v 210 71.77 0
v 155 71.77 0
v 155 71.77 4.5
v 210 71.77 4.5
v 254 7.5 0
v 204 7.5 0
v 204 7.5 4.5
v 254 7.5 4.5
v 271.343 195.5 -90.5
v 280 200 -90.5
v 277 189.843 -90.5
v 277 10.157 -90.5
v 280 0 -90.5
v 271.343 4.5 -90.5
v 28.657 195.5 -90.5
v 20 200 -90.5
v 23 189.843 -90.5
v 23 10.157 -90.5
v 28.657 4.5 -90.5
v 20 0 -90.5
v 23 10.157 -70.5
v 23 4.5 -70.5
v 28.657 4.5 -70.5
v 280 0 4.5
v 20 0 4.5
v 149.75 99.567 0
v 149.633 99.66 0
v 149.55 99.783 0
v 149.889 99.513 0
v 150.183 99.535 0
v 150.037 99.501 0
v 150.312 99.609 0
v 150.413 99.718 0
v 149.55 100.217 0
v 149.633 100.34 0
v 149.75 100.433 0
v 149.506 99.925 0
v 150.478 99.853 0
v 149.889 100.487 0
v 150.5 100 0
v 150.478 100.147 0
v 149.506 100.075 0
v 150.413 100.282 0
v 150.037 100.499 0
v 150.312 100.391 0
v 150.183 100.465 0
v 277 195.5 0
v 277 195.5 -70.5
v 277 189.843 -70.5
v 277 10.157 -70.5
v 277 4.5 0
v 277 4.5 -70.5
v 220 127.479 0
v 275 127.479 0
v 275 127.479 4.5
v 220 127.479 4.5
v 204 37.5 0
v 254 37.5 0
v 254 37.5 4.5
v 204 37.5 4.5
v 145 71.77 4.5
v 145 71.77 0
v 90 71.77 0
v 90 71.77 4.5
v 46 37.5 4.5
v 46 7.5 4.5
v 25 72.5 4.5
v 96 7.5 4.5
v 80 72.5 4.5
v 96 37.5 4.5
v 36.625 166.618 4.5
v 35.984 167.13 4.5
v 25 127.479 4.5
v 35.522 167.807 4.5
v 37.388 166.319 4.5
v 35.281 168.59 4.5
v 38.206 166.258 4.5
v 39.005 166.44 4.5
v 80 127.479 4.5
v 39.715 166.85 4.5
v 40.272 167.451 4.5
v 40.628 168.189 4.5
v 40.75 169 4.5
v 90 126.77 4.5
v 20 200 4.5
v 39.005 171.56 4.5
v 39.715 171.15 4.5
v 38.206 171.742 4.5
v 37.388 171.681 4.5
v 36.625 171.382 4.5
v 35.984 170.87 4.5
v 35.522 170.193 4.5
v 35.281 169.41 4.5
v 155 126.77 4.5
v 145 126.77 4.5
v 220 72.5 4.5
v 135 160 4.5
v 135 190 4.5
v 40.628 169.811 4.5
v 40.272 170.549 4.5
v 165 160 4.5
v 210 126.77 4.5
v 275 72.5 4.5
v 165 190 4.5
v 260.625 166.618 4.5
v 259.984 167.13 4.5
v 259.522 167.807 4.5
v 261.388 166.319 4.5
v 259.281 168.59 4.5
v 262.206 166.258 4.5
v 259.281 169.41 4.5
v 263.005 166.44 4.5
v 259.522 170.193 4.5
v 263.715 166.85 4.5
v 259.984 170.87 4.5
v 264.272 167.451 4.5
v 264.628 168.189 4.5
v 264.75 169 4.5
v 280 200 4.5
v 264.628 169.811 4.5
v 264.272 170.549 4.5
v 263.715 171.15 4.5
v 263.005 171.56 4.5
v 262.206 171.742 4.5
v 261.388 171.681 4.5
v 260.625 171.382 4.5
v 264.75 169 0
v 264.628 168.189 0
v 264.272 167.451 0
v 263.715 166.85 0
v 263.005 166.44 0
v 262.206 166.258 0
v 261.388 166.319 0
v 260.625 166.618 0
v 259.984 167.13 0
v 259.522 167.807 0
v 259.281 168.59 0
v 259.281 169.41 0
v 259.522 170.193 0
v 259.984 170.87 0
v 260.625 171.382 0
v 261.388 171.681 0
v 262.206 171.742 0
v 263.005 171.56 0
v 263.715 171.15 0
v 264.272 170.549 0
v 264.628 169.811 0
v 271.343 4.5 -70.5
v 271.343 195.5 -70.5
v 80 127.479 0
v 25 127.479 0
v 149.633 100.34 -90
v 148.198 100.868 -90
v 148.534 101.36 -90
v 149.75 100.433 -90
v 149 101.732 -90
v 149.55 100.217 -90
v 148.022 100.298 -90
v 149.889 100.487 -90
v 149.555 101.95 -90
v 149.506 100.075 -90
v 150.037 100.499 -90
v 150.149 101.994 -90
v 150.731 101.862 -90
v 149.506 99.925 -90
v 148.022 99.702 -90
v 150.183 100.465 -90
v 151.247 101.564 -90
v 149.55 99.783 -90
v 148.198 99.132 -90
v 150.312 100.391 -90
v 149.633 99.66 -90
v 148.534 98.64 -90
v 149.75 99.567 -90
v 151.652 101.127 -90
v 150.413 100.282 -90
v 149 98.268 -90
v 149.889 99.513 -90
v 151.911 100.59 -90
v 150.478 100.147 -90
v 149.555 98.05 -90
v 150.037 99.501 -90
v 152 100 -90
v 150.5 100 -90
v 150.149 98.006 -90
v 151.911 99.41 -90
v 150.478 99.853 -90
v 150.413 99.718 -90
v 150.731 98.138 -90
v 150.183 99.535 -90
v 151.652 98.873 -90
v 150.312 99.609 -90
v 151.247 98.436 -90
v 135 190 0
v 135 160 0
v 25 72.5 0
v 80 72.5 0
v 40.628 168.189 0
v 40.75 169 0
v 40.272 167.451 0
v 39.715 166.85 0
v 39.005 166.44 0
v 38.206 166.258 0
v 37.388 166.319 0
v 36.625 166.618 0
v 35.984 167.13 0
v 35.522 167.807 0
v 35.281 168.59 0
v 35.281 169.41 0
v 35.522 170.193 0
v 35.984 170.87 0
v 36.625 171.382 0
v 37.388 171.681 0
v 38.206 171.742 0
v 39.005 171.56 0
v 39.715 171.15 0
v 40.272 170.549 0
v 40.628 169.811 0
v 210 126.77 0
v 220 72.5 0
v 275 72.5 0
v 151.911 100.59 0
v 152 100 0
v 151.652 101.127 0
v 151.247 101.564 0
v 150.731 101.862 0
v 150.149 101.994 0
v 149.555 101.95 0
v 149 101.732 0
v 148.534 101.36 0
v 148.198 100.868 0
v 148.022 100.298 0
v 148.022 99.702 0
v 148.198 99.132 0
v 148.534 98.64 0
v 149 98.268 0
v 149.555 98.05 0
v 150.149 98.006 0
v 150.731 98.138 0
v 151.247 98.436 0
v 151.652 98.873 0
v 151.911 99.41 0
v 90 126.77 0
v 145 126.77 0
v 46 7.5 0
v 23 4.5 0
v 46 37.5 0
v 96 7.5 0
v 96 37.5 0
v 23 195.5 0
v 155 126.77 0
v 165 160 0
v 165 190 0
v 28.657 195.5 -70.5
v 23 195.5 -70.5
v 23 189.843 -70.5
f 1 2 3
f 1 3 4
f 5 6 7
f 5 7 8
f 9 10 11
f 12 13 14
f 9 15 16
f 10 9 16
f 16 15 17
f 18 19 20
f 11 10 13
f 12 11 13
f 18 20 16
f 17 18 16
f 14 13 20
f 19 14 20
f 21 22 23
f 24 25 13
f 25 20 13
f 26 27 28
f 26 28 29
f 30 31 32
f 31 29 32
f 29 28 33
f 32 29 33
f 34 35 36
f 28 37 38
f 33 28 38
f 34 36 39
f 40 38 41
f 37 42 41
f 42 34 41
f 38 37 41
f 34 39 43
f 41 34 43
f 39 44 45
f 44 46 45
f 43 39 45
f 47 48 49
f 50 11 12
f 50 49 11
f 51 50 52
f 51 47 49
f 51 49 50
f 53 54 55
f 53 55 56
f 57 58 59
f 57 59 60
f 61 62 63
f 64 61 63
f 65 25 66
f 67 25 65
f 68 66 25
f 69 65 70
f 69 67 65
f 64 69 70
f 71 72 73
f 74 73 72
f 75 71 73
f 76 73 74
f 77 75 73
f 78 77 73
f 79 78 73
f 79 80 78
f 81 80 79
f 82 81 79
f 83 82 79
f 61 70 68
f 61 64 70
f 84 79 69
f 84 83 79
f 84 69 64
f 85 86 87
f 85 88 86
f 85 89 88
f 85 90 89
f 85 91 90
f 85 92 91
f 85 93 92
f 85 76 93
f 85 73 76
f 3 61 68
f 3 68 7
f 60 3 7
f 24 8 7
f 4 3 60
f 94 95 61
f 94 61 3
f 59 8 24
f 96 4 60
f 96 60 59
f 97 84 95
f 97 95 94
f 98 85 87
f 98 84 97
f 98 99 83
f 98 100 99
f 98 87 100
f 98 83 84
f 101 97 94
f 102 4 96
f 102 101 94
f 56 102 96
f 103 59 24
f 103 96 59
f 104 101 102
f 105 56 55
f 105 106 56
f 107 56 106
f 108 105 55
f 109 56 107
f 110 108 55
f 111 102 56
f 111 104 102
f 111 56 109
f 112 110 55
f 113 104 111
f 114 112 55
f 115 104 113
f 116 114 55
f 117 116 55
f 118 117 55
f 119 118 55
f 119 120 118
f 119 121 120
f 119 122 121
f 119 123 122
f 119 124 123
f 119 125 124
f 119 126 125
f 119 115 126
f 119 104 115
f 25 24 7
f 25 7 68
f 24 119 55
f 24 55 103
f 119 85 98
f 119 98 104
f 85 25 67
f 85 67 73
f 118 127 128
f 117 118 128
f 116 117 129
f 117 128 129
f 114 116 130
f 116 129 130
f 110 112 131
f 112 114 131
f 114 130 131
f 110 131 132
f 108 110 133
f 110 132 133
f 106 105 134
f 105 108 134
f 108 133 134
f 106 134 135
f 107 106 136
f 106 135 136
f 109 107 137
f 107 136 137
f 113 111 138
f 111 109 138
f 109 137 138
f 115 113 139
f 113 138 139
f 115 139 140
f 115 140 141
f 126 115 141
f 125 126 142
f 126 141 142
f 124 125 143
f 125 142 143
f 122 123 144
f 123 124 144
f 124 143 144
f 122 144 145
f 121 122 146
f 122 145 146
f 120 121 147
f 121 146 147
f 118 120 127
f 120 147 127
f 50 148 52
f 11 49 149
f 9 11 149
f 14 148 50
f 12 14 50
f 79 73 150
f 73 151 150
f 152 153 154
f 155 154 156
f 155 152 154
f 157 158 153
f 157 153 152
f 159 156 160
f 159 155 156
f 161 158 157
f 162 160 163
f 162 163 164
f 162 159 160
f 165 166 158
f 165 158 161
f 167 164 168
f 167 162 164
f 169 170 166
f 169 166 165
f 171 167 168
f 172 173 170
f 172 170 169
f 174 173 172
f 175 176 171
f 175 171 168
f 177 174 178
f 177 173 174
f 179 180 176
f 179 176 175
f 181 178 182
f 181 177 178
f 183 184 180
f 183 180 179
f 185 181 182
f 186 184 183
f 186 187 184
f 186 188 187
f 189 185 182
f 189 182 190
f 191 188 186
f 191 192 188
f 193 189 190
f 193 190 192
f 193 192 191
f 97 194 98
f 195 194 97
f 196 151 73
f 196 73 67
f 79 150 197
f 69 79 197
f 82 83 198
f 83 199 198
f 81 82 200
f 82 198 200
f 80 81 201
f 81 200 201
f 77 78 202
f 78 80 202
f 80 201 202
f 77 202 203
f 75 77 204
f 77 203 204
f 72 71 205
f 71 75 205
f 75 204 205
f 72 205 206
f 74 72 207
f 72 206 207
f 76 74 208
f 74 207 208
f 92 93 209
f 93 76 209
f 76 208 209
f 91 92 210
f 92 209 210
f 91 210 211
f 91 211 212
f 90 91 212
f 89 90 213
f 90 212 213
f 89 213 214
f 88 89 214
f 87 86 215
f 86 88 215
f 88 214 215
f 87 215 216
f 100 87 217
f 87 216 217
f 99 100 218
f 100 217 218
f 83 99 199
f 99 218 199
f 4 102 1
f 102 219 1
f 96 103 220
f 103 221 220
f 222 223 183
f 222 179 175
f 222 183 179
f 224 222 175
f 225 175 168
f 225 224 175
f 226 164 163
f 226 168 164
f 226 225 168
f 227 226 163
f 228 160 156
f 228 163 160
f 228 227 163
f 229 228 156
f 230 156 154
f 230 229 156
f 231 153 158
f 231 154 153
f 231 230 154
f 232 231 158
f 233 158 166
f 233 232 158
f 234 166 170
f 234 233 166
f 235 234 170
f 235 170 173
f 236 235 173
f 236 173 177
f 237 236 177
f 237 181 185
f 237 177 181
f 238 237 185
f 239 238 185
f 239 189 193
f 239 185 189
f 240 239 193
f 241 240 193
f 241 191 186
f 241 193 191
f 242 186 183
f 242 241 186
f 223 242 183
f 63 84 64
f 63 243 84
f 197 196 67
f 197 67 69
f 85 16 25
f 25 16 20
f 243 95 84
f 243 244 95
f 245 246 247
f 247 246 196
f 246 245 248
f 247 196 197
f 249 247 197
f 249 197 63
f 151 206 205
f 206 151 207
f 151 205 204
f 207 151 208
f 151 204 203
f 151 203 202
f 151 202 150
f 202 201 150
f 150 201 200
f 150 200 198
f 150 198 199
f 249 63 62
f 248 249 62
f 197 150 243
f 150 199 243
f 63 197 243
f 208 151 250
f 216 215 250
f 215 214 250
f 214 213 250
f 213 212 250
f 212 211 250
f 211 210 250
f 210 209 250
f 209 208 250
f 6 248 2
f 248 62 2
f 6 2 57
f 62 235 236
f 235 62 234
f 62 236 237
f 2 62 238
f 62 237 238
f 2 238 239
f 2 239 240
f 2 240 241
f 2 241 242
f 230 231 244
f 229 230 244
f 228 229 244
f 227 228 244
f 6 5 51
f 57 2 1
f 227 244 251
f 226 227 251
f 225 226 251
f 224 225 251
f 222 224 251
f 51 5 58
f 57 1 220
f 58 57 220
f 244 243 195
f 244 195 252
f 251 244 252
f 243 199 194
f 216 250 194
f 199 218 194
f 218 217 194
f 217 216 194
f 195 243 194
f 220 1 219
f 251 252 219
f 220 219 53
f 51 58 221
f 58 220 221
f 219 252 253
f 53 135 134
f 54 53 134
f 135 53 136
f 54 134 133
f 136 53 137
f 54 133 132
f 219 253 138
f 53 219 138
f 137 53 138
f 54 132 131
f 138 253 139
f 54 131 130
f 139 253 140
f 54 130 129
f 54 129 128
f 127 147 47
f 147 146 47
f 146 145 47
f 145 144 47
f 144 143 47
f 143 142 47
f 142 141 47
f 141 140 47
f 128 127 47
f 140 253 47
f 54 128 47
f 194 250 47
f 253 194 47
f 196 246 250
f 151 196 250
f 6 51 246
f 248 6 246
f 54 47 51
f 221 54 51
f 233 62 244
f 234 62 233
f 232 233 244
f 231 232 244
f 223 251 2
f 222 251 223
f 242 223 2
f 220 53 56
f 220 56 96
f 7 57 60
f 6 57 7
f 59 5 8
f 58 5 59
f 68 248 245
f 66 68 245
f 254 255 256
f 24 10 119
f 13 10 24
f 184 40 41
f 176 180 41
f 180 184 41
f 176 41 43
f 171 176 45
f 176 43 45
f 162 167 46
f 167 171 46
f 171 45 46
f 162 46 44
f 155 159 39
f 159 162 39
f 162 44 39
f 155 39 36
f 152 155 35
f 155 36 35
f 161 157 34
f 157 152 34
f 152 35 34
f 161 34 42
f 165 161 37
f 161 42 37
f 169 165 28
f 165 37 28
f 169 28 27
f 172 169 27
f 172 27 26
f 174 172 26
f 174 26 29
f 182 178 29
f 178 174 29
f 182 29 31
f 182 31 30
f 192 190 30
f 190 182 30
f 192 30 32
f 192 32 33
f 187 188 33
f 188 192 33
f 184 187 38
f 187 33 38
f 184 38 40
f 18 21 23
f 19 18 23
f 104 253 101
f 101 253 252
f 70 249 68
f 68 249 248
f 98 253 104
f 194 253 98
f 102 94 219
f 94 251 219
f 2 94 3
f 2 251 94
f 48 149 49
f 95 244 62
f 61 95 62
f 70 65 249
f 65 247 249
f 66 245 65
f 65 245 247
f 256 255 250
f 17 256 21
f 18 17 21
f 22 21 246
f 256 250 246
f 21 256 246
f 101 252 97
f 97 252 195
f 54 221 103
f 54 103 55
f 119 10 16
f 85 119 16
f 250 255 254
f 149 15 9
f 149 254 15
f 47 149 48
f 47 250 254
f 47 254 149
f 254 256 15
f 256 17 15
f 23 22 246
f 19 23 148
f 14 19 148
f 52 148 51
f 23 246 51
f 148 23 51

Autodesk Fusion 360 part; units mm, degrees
sketch "Sketch1" plane through (0, 0, 0) normal (0, 0, 1) x (1, 0, 0)
  line L0 (0, -35) -> (0, -33.2289) construction
  line L1 (0, -33.2289) -> (0, 259.056) construction
  line L2 (-97.9811, 0) -> (484.4158, 0) construction
  line L3 (0, 0) -> (300, 0)
  line L4 (300, 0) -> (300, 200)
  line L5 (300, 200) -> (0, 200)
  line L6 (0, 200) -> (0, 0)
  line L7 (-60, 100) -> (400, 100) construction
  line L8 (25, 100) -> (25, 127.4792)
  line L9 (25, 100) -> (25, 72.5)
  line L10 (25, 127.4792) -> (80, 127.4792)
  line L11 (25, 72.5) -> (80, 72.5)
  line L12 (80, 127.4792) -> (80, 72.5)
  line L13 (21.5, 100) -> (21.5, 131) construction
  line L14 (21.5, 131) -> (83.5, 131) construction
  line L15 (21.4997, 69) -> (83.5, 69) construction
  circle A0 centre (52.5, 100) radius 31 construction
  circle A1 centre (52.5, 100) radius 27.5 construction
  line L16 (83.5, 131) -> (83.5, 69) construction
  line L17 (290, 69) -> (228, 69) construction
  line L18 (290, 100) -> (290, 69) construction
  line L19 (290, 100) -> (290, 131) construction
  line L20 (290, 131) -> (228, 131) construction
  line L21 (228, 131) -> (228, 69) construction
  line L22 (145, 126.7699) -> (90, 126.7699)
  line L23 (146, 151.2972) -> (93.5, 114.6946) construction
  line L24 (93.5, 114.6946) -> (93.5, 69) construction
  line L25 (146, 69) -> (93.5, 69) construction
  line L26 (146, 100) -> (146, 69) construction
  line L27 (146, 100) -> (146, 151.2972) construction
  line L28 (145, 71.7699) -> (90, 71.7699)
  line L29 (90, 126.7699) -> (90, 71.7699)
  line L30 (156, 131) -> (218, 131) construction
  line L31 (218, 131) -> (218, 69) construction
  line L32 (156, 100) -> (156, 131) construction
  line L33 (156, 100) -> (156, 69) construction
  line L34 (156, 69) -> (218, 69) construction
  line L35 (46, 37.5) -> (96, 37.5)
  line L36 (96, 7.5) -> (46, 7.5)
  line L37 (46, 7.5) -> (46, 37.5)
  line L38 (96, 37.5) -> (96, 7.5)
  line L39 (94, 6) -> (44, 6) construction
  line L40 (44, 6) -> (44, 39) construction
  line L41 (44, 39) -> (94, 39) construction
  line L42 (94, 39) -> (94, 6) construction
  line L43 (94, 6) -> (44, 39) construction
  line L44 (44, 6) -> (94, 39) construction
  line L45 (254, 37.5) -> (204, 37.5)
  line L46 (254, 7.5) -> (254, 37.5)
  line L47 (204, 7.5) -> (254, 7.5)
  line L48 (204, 37.5) -> (204, 7.5)
  circle A2 centre (38, 169) radius 2.75
  circle A3 centre (262, 169) radius 2.75
  line L49 (150, 200) -> (150, 0) construction
  line L50 (145, 126.7699) -> (145, 71.7699)
  line L51 (150, 190) -> (135, 190)
  line L52 (150, 190) -> (165, 190)
  line L53 (135, 190) -> (135, 160)
  line L54 (165, 190) -> (165, 160)
  line L55 (165, 160) -> (135, 160)
  line L56 (155, 126.7699) -> (155, 71.7699)
  line L57 (155, 126.7699) -> (210, 126.7699)
  line L58 (155, 71.7699) -> (210, 71.7699)
  line L59 (210, 126.7699) -> (210, 71.7699)
  line L60 (220, 127.4792) -> (220, 72.5)
  line L61 (275, 127.4792) -> (220, 127.4792)
  line L62 (275, 100) -> (275, 127.4792)
  line L63 (275, 100) -> (275, 72.5)
  line L64 (275, 72.5) -> (220, 72.5)
  line L65 (280, 200) -> (280, 0)
  line L66 (20, 200) -> (20, 0)
  point P0 (69, 22.5)
  dimension "d1" = 300
  dimension "d2" = 200
  dimension "d9" = 27.5
  dimension "d12" = 31
  dimension "d13" = 31
  dimension "d14" = 62
  dimension "d15" = 62
  dimension "d17" = 62
  dimension "d18" = 55
  dimension "d31" = 50
  dimension "d32" = 30
  dimension "d37" = 50
  dimension "d38" = 33
  dimension "d39" = 46
  dimension "d40" = 30
  dimension "d41" = 31.5
  dimension "d42" = 5.5
  dimension "d43" = 38
  dimension "d44" = 38
  dimension "d54" = 10
  dimension "d55" = 4
  dimension "d56" = 64
  dimension "d57" = 55
  dimension "d62" = 55
  dimension "d64" = 55
  dimension "d65" = 90
  dimension "d66" = 90
  dimension "d67" = 90
  dimension "d68" = 90
  dimension "d69" = 10
  dimension "d70" = 5
  dimension "d71" = 15
  dimension "d72" = 15
  dimension "d73" = 30
  dimension "d74" = 46
  dimension "d75" = 50
  dimension "d76" = 30
  dimension "d79" = 20
  dimension "d80" = 20
sketch "Sketch2" plane through (0, 0, 5) normal (0, 0, 1) x (-1, 0, 0)
  line L0 (-145, -71.7699) -> (-90, -71.7699)
  line L1 (-90, -71.7699) -> (-90, -126.7699)
  line L2 (-90, -126.7699) -> (-145, -126.7699)
  circle A0 centre (-38, -169) radius 2.75
  circle A1 centre (-262, -169) radius 2.75
  line L3 (-204, -7.5) -> (-204, -37.5)
  line L4 (-204, -37.5) -> (-254, -37.5)
  line L5 (-254, -37.5) -> (-254, -7.5)
  line L6 (-254, -7.5) -> (-204, -7.5)
  line L7 (-46, -37.5) -> (-96, -37.5)
  line L8 (-96, -37.5) -> (-96, -7.5)
  line L9 (-96, -7.5) -> (-46, -7.5)
  line L10 (-46, -7.5) -> (-46, -37.5)
  line L11 (-25, -72.5) -> (-25, -127.4792)
  line L12 (-25, -127.4792) -> (-80, -127.4792)
  line L13 (-80, -127.4792) -> (-80, -72.5)
  line L14 (-80, -72.5) -> (-25, -72.5)
  line L15 (0, -200) -> (0, 0)
  line L16 (0, 0) -> (-300, 0)
  line L17 (-300, 0) -> (-300, -200)
  line L18 (-300, -200) -> (0, -200)
  line L19 (0, -200) -> (0, 0)
  line L20 (-1, -200) -> (-1, 0)
  line L21 (-299, -200) -> (-299, 0)
  line L22 (-300, -200) -> (-300, 0)
  line L23 (-299, -200) -> (-300, -200)
  line L24 (-300, 0) -> (-299, 0)
  line L25 (-1, 0) -> (0, 0)
  line L26 (0, -200) -> (-1, -200)
  line L27 (-145, -126.7699) -> (-145, -71.7699)
  dimension "d49" = 1
  dimension "d50" = 1
sketch "Sketch5" plane through (0, 0, 0) normal (0, 0, 1) x (1, 0, 0)
  line L0 (20, 200) -> (20, 0)
  line L1 (0, -33.2289) -> (0, 259.056)
  line L2 (280, 200) -> (280, 0)
  line L3 (300, 0) -> (300, 200)
  dimension "d77" = 20
  dimension "d78" = 20
extrude "Extrude4" add sketch "Sketch1" along normal blind 4.5 contours L3 L5 L65 L66
sketch "Sketch6" plane through (0, 0, 4.5) normal (0, 0, 1) x (-1, 0, 0)
  circle A0 centre (-262, -169) radius 2.75
  line L0 (-90, -71.7699) -> (-90, -126.7699)
  line L1 (-90, -126.7699) -> (-145, -126.7699)
  line L2 (-145, -126.7699) -> (-145, -71.7699)
  line L3 (-145, -71.7699) -> (-90, -71.7699)
  line L4 (-25, -72.5) -> (-25, -127.4792)
  line L5 (-25, -127.4792) -> (-80, -127.4792)
  line L6 (-80, -127.4792) -> (-80, -72.5)
  line L7 (-80, -72.5) -> (-25, -72.5)
  line L8 (-46, -37.5) -> (-96, -37.5)
  line L9 (-96, -37.5) -> (-96, -7.5)
  line L10 (-96, -7.5) -> (-46, -7.5)
  line L11 (-46, -7.5) -> (-46, -37.5)
  line L12 (-204, -7.5) -> (-204, -37.5)
  line L13 (-204, -37.5) -> (-254, -37.5)
  line L14 (-254, -37.5) -> (-254, -7.5)
  line L15 (-254, -7.5) -> (-204, -7.5)
  line L16 (-135, -190) -> (-165, -190)
  line L17 (-165, -190) -> (-165, -160)
  line L18 (-165, -160) -> (-135, -160)
  line L19 (-135, -160) -> (-135, -190)
  circle A1 centre (-38, -169) radius 2.75
  line L20 (-155, -71.7699) -> (-155, -126.7699)
  line L21 (-155, -126.7699) -> (-210, -126.7699)
  line L22 (-210, -126.7699) -> (-210, -71.7699)
  line L23 (-210, -71.7699) -> (-155, -71.7699)
  line L24 (-275, -127.4792) -> (-275, -72.5)
  line L25 (-275, -72.5) -> (-220, -72.5)
  line L26 (-220, -72.5) -> (-220, -127.4792)
  line L27 (-220, -127.4792) -> (-275, -127.4792)
  line L28 (-280, -200) -> (-20, -200)
  line L29 (-20, -200) -> (-20, 0)
  line L30 (-20, 0) -> (-280, 0)
  line L31 (-280, 0) -> (-280, -200)
  line L32 (-23, -200) -> (-23, 0)
  line L33 (-277, -200) -> (-277, 0)
  line L34 (-23, -200) -> (-20, -200)
  line L35 (-20, -200) -> (-20, 0)
  line L36 (-23, 0) -> (-20, 0)
  line L37 (-277, 0) -> (-280, 0)
  line L38 (-280, 0) -> (-280, -200)
  line L39 (-277, -200) -> (-280, -200)
  dimension "d83" = 3
  dimension "d84" = 3
extrude "Extrude5" add sketch "Sketch6" against normal blind 95 contours L28 L30 L31 L33 L37 L38 L39 | L28 L29 L30 L32 L34 L35 L36
sketch "Sketch7" plane through (0, 0, 4.5) normal (0, 0, 1) x (-1, 0, 0)
  line L0 (-20, 0) -> (-280, 0)
  line L1 (-280, 0) -> (-280, -200)
  line L2 (-280, -200) -> (-20, -200)
  line L3 (-20, -200) -> (-20, 0)
  circle A0 centre (-262, -169) radius 2.75
  line L4 (-90, -71.7699) -> (-90, -126.7699)
  line L5 (-90, -126.7699) -> (-145, -126.7699)
  line L6 (-145, -126.7699) -> (-145, -71.7699)
  line L7 (-145, -71.7699) -> (-90, -71.7699)
  line L8 (-25, -72.5) -> (-25, -127.4792)
  line L9 (-25, -127.4792) -> (-80, -127.4792)
  line L10 (-80, -127.4792) -> (-80, -72.5)
  line L11 (-80, -72.5) -> (-25, -72.5)
  line L12 (-46, -37.5) -> (-96, -37.5)
  line L13 (-96, -37.5) -> (-96, -7.5)
  line L14 (-96, -7.5) -> (-46, -7.5)
  line L15 (-46, -7.5) -> (-46, -37.5)
  line L16 (-204, -7.5) -> (-204, -37.5)
  line L17 (-204, -37.5) -> (-254, -37.5)
  line L18 (-254, -37.5) -> (-254, -7.5)
  line L19 (-254, -7.5) -> (-204, -7.5)
  line L20 (-135, -190) -> (-165, -190)
  line L21 (-165, -190) -> (-165, -160)
  line L22 (-165, -160) -> (-135, -160)
  line L23 (-135, -160) -> (-135, -190)
  circle A1 centre (-38, -169) radius 2.75
  line L24 (-155, -71.7699) -> (-155, -126.7699)
  line L25 (-155, -126.7699) -> (-210, -126.7699)
  line L26 (-210, -126.7699) -> (-210, -71.7699)
  line L27 (-210, -71.7699) -> (-155, -71.7699)
  line L28 (-275, -127.4792) -> (-275, -72.5)
  line L29 (-275, -72.5) -> (-220, -72.5)
  line L30 (-220, -72.5) -> (-220, -127.4792)
  line L31 (-220, -127.4792) -> (-275, -127.4792)
  line L32 (-20, -4.5) -> (-280, -4.5)
  line L33 (-20, -195.5) -> (-280, -195.5)
  line L34 (-280, -195.5) -> (-280, -200)
  line L35 (-280, -200) -> (-20, -200)
  line L36 (-20, -195.5) -> (-20, -200)
  line L37 (-20, -4.5) -> (-20, 0)
  line L38 (-20, 0) -> (-280, 0)
  line L39 (-280, 0) -> (-280, -4.5)
  dimension "d87" = 4.5
  dimension "d88" = 4.5
extrude "Extrude6" add sketch "Sketch7" against normal blind 95 contours L0 L1 L3 L32 L37 L38 L39 | L1 L2 L3 L33 L34 L35 L36
sketch "Sketch8" plane through (0, 0, 0) normal (0, 0, -1) x (1, 0, 0)
  line L0 (275, -72.5) -> (275, -127.4792)
  line L1 (275, -127.4792) -> (220, -127.4792)
  line L2 (220, -127.4792) -> (220, -72.5)
  line L3 (220, -72.5) -> (275, -72.5)
  line L4 (155, -126.7699) -> (155, -71.7699)
  line L5 (155, -71.7699) -> (210, -71.7699)
  line L6 (210, -71.7699) -> (210, -126.7699)
  line L7 (210, -126.7699) -> (155, -126.7699)
  circle A0 centre (38, -169) radius 2.75
  line L8 (165, -190) -> (135, -190)
  line L9 (135, -190) -> (135, -160)
  line L10 (135, -160) -> (165, -160)
  line L11 (165, -160) -> (165, -190)
  line L12 (204, -37.5) -> (204, -7.5)
  line L13 (204, -7.5) -> (254, -7.5)
  line L14 (254, -7.5) -> (254, -37.5)
  line L15 (254, -37.5) -> (204, -37.5)
  line L16 (96, -37.5) -> (46, -37.5)
  line L17 (46, -37.5) -> (46, -7.5)
  line L18 (46, -7.5) -> (96, -7.5)
  line L19 (96, -7.5) -> (96, -37.5)
  line L20 (25, -127.4792) -> (25, -72.5)
  line L21 (25, -72.5) -> (80, -72.5)
  line L22 (80, -72.5) -> (80, -127.4792)
  line L23 (80, -127.4792) -> (25, -127.4792)
  line L24 (90, -126.7699) -> (90, -71.7699)
  line L25 (90, -71.7699) -> (145, -71.7699)
  line L26 (145, -71.7699) -> (145, -126.7699)
  line L27 (145, -126.7699) -> (90, -126.7699)
  circle A1 centre (262, -169) radius 2.75
  line L28 (277, -4.5) -> (23, -4.5)
  line L29 (23, -4.5) -> (23, -195.5)
  line L30 (23, -195.5) -> (277, -195.5)
  line L31 (277, -195.5) -> (277, -4.5)
  circle A2 centre (150, -100) radius 2
  circle A3 centre (150, -100) radius 0.5
  dimension "d91" = 1
extrude "Extrude7" add sketch "Sketch8" along normal blind 90 contours A2
sketch "Sketch9" plane through (0, 0, -90.5) normal (0, 0, -1) x (1, 0, 0)
  line L0 (277, -4.5) -> (277, -195.5)
  line L1 (277, -195.5) -> (23, -195.5)
  line L2 (23, -195.5) -> (23, -4.5)
  line L3 (23, -4.5) -> (277, -4.5)
  line L4 (280, 0) -> (20, 0)
  line L5 (20, 0) -> (20, -200)
  line L6 (20, -200) -> (280, -200)
  line L7 (280, -200) -> (280, 0)
  line L8 (271.3431, -4.5) -> (277, -10.1569)
  line L9 (23, -189.8431) -> (28.6569, -195.5)
  line L10 (23, -10.1569) -> (28.6569, -4.5)
  line L11 (277, -189.8431) -> (271.3431, -195.5)
  dimension "d94" = 45
  dimension "d96" = 45
  dimension "d98" = 45
  dimension "d99" = 45
  dimension "d100" = 45
  dimension "d101" = 8
  dimension "d102" = 8
  dimension "d104" = 8
  dimension "d105" = 8
extrude "Extrude8" add sketch "Sketch9" against normal blind 20 contours L0 L3 L8 | L0 L1 L11 | L2 L3 L10 | L1 L2 L9
